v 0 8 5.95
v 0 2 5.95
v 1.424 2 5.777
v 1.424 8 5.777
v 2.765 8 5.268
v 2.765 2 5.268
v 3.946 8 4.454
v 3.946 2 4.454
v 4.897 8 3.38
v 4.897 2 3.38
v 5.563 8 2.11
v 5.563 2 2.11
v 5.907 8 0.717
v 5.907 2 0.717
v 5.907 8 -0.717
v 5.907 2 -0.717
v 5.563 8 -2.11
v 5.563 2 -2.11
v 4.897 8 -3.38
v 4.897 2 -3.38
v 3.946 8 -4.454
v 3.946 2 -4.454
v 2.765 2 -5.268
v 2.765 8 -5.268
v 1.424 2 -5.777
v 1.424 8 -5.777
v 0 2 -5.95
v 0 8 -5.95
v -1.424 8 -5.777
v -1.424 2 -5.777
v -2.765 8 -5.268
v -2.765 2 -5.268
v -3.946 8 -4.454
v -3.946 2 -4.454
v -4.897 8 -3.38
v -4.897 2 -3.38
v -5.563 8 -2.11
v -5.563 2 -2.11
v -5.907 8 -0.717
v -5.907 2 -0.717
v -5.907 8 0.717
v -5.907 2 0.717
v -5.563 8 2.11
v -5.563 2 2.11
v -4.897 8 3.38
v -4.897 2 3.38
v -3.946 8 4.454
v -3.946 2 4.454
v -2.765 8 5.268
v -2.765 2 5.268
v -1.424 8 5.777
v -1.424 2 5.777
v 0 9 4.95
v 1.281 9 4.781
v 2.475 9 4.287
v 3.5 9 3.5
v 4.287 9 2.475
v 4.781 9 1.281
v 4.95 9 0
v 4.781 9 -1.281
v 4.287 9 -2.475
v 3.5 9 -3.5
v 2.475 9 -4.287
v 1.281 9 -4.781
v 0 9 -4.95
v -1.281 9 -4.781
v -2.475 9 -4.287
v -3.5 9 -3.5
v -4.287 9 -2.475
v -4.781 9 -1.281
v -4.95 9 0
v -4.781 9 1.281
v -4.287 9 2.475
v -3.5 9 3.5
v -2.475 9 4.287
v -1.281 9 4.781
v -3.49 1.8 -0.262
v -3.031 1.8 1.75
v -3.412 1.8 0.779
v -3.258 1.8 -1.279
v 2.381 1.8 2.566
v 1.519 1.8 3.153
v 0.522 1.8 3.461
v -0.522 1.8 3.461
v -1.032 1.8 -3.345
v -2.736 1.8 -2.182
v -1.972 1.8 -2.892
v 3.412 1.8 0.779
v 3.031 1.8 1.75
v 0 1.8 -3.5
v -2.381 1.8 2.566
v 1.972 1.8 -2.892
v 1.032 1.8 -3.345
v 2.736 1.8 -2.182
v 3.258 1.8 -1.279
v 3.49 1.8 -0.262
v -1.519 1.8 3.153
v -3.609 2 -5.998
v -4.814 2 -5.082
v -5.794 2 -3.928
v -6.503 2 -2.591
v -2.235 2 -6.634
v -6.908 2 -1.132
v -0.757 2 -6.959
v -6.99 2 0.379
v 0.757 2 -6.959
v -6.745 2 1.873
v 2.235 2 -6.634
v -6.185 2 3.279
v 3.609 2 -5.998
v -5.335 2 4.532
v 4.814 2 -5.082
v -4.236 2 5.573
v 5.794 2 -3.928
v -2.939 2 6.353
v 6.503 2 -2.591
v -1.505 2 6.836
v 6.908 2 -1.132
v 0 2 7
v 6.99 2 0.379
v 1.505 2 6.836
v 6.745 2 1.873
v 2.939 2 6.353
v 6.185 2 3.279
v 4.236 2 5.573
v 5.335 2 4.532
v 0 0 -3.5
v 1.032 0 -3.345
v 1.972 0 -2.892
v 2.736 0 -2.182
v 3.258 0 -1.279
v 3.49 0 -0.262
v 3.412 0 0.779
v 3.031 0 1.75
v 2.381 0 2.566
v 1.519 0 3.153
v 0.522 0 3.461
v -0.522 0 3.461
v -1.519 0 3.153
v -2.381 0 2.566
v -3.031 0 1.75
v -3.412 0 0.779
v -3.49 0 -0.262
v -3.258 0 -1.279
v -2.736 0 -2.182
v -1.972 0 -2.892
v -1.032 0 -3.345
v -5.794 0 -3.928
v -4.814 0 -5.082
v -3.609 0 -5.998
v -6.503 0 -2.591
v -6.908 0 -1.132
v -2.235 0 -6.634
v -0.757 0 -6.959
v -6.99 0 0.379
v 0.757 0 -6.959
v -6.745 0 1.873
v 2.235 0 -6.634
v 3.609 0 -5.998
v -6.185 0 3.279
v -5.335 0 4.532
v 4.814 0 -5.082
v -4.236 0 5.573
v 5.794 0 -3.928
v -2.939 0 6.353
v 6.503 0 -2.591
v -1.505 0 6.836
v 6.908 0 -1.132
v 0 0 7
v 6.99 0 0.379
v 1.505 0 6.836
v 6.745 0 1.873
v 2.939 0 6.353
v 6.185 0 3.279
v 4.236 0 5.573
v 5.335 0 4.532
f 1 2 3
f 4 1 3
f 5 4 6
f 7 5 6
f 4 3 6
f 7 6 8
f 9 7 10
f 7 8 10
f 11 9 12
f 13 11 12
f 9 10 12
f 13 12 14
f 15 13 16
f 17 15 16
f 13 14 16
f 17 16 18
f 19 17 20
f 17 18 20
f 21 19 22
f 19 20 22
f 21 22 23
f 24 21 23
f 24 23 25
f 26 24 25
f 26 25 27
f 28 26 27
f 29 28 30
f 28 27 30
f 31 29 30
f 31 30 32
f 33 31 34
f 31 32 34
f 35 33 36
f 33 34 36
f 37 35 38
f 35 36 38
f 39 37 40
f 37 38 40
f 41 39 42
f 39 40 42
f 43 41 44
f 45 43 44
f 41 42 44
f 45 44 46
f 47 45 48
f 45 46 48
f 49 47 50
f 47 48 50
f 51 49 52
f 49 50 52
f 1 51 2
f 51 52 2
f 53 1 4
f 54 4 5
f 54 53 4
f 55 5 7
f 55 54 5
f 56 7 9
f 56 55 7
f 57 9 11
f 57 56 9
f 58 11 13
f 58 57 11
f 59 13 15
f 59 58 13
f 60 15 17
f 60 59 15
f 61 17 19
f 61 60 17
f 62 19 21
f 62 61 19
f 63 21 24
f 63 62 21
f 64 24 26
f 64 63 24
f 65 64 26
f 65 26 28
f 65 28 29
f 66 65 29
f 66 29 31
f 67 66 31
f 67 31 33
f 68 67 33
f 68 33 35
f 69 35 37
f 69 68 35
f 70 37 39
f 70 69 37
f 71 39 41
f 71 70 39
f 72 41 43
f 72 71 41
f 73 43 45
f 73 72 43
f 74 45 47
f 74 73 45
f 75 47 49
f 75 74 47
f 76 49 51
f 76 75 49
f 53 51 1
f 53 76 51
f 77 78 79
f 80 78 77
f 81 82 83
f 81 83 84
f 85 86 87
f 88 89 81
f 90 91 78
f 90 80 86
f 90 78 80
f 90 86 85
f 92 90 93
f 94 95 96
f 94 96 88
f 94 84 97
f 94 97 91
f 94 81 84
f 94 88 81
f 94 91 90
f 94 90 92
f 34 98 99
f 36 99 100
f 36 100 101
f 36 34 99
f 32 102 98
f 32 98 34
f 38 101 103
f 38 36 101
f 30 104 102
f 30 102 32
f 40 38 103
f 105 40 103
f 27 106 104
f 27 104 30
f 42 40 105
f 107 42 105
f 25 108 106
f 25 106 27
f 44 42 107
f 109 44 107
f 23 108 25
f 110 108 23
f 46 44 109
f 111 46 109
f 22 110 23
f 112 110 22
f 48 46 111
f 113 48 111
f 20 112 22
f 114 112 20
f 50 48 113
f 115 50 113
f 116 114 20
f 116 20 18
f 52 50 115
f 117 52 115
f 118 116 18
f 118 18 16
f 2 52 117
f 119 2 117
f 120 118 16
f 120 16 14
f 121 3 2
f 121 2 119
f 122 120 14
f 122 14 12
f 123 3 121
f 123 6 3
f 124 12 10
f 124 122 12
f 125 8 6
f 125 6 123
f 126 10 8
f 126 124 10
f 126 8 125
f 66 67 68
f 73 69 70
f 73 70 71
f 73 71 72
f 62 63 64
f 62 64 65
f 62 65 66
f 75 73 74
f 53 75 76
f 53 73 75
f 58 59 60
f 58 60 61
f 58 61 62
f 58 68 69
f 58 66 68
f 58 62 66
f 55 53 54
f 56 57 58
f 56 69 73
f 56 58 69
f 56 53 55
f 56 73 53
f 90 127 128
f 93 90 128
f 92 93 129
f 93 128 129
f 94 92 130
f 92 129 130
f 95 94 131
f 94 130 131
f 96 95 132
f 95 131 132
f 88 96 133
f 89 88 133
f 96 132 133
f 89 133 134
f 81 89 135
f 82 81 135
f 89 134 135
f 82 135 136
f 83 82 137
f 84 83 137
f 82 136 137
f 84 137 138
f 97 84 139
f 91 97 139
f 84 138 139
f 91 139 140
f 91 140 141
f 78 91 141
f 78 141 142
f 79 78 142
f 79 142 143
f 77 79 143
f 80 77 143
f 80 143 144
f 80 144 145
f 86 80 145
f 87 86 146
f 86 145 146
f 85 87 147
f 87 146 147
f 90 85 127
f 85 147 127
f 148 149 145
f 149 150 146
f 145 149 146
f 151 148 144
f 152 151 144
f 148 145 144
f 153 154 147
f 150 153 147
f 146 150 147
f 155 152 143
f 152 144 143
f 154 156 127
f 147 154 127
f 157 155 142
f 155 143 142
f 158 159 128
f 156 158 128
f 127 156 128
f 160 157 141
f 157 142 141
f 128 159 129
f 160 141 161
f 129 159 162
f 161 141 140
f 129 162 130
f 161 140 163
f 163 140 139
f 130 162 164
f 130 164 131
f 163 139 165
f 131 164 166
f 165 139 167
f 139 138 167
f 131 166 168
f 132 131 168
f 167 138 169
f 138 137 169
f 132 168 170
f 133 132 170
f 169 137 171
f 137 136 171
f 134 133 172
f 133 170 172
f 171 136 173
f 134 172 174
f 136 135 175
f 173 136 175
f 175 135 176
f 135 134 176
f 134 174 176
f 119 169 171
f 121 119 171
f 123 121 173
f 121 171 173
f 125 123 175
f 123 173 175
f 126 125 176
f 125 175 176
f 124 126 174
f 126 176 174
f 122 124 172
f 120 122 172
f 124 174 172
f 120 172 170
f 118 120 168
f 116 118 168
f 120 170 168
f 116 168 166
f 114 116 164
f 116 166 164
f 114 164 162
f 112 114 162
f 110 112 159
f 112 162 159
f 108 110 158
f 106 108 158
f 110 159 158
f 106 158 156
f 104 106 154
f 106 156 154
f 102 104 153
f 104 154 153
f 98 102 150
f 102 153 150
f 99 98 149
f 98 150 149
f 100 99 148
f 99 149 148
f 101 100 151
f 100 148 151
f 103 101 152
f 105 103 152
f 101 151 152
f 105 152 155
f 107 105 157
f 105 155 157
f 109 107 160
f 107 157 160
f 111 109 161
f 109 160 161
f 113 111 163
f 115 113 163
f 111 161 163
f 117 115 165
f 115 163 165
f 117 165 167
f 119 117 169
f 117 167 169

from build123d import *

# Parameters (mm, degrees)
SKETCH1_R           = 7
BOSS_EXTRUDE1_DEPTH = 2
SKETCH2_R           = 5.95
BOSS_EXTRUDE2_DEPTH = 7
SKETCH3_R           = 3.5
CUT_EXTRUDE1_DEPTH  = 1.8
CHAMFER1_SIZE       = 1


with BuildPart() as part:
    # Sketch1 → Boss-Extrude1 (new body)
    with BuildSketch(Plane(origin=(0, 0, 0), x_dir=(1, 0, 0), z_dir=(0, 1, 0))):
        with Locations(Location((0, 0, 0), (0, 0, 270))):
            Circle(SKETCH1_R)
    extrude(amount=BOSS_EXTRUDE1_DEPTH)

    # Sketch2 → Boss-Extrude2 (add)
    with BuildSketch(Plane(origin=(0, 2, 0), x_dir=(1, 0, 0), z_dir=(0, 1, 0))):
        with Locations(Location((0, 0, 0), (0, 0, 270))):
            Circle(SKETCH2_R)
    extrude(amount=BOSS_EXTRUDE2_DEPTH)

    # Sketch3 → Cut-Extrude1 (cut)
    with BuildSketch(Plane.XZ):
        with Locations(Location((0, 0, 0), (0, 0, 270))):
            Circle(SKETCH3_R)
    extrude(amount=-CUT_EXTRUDE1_DEPTH, mode=Mode.SUBTRACT)

    # Chamfer1
    chamfer1_edges = [part.edges().sort_by_distance(p)[0] for p in [
        (0, 9, -5.95),
    ]]
    chamfer(chamfer1_edges, length=CHAMFER1_SIZE)


solid = part.part
